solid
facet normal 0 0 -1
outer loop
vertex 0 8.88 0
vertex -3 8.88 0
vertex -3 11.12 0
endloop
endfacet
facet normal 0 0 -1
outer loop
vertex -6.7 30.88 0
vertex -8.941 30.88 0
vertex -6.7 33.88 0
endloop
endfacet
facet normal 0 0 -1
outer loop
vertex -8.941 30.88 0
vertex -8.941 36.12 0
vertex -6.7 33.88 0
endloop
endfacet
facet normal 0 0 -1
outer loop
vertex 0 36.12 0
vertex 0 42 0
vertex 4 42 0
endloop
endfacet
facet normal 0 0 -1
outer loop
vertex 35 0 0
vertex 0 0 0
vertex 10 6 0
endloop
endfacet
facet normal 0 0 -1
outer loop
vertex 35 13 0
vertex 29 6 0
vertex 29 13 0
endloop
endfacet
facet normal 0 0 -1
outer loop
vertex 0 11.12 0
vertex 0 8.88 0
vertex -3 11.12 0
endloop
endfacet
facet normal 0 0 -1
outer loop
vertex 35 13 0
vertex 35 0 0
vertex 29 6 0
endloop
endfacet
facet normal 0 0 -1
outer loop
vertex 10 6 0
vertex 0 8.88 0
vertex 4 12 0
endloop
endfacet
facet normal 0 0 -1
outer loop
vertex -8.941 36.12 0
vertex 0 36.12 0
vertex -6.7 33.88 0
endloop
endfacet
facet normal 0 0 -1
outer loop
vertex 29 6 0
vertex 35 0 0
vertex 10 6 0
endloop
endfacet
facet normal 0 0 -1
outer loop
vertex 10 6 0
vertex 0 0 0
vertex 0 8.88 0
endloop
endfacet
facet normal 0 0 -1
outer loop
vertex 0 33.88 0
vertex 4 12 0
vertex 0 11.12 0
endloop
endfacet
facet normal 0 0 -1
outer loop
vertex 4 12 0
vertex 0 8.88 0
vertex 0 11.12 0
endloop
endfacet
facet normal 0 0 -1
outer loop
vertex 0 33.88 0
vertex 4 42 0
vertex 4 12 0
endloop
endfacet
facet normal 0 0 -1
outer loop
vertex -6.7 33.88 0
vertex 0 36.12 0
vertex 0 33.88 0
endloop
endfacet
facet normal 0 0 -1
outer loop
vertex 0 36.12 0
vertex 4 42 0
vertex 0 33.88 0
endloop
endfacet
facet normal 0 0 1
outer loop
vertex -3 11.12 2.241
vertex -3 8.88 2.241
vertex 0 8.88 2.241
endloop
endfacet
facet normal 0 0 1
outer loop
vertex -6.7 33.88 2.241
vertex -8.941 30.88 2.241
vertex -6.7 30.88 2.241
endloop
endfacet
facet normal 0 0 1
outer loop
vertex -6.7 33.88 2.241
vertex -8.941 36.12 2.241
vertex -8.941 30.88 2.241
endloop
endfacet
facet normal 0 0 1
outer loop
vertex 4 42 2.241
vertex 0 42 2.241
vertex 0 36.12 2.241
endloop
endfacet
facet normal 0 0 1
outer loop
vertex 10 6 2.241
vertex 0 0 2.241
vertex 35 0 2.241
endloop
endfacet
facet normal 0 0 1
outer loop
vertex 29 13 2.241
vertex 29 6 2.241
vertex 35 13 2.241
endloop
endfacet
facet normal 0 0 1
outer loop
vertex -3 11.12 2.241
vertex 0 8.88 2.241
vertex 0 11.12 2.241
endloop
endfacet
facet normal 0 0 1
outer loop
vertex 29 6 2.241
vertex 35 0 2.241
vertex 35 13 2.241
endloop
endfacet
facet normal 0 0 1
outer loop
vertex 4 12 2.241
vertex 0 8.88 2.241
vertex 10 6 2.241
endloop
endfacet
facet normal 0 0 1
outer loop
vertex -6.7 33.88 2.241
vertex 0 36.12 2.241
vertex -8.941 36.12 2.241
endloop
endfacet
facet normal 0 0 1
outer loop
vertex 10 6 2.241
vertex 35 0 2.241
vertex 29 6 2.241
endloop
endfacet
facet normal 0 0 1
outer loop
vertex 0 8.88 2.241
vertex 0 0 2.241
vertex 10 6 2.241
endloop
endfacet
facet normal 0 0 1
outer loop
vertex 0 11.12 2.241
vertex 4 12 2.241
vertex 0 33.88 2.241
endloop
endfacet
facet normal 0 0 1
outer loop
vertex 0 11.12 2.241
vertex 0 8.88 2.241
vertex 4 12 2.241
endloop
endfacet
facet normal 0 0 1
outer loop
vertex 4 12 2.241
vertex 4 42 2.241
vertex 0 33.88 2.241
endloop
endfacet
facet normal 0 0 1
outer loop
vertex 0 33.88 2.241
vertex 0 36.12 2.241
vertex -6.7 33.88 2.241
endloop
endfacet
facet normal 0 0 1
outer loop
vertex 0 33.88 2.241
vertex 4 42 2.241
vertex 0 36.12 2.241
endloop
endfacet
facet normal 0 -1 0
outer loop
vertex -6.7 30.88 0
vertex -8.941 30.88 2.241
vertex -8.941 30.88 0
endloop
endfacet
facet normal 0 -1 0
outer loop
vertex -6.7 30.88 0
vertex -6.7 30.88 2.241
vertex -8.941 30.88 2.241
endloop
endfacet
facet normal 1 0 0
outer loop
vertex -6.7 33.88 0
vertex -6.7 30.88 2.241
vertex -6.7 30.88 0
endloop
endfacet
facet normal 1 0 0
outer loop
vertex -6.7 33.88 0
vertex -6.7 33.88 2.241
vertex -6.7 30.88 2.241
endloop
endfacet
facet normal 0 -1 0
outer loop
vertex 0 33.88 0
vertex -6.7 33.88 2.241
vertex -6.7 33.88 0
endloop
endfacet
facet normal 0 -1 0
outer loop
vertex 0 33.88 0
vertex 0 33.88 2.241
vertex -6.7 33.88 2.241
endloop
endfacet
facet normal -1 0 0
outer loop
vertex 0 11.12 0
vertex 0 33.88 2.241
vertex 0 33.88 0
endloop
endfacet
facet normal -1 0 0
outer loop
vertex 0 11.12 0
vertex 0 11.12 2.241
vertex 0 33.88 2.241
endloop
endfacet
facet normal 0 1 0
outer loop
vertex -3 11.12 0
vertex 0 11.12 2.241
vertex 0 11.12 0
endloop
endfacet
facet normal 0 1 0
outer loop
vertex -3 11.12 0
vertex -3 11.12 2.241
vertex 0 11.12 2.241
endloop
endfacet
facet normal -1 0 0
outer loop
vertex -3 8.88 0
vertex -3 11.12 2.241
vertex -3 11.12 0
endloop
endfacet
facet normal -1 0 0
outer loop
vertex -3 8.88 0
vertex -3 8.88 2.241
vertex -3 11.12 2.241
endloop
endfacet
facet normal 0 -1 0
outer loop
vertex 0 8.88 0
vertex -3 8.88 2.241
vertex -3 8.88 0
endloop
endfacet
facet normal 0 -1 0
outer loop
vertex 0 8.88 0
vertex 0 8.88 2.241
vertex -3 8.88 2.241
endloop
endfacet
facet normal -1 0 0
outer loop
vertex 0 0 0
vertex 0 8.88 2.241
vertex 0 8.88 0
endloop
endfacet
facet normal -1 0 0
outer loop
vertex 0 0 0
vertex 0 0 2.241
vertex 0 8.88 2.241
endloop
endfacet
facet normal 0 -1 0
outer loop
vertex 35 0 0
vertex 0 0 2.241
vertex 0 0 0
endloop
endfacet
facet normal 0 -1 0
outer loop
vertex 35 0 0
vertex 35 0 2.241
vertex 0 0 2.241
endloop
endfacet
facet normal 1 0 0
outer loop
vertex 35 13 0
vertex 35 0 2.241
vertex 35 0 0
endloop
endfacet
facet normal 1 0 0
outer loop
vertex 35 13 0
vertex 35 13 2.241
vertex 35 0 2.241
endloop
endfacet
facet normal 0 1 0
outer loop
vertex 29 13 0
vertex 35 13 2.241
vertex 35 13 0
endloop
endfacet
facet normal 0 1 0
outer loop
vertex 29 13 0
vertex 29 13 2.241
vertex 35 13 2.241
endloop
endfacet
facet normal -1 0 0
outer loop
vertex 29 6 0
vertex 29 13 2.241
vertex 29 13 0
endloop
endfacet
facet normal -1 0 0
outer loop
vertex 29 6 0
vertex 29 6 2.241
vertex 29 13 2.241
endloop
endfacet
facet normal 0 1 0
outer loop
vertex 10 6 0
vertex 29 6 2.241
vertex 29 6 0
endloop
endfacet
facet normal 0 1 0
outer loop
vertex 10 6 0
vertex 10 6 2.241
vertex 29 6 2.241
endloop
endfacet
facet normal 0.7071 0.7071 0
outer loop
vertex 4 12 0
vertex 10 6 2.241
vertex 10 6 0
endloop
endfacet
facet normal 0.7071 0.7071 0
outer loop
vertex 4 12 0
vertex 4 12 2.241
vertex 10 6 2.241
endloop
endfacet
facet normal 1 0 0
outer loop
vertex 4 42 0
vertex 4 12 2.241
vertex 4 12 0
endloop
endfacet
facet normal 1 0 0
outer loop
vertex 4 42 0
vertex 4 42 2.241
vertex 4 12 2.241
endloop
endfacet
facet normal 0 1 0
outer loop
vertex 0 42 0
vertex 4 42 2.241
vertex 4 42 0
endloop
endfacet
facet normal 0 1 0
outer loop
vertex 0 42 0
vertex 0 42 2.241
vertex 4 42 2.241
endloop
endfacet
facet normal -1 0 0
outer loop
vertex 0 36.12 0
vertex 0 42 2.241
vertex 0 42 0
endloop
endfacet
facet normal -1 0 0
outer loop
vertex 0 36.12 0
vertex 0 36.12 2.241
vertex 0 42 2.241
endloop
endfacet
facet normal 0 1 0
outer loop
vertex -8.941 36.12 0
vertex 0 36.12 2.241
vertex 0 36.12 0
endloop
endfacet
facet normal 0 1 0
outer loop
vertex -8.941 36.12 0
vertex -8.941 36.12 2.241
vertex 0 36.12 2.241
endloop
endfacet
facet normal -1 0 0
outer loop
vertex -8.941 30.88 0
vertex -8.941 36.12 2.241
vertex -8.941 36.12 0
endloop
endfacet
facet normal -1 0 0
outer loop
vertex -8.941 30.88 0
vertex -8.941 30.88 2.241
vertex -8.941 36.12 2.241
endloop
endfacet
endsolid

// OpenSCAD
// Multiboard small-hole peg hook for light cables; dimensions in mm.
// Print as shown on its broad side at Z=0, no supports, 4 perimeters.
// In use +Y is up, +X faces away from the board. Hold the hook 1.5 mm high,
// push both pegs through, then lower so the downward return catches the rear.
// Lift before removal. The thin, flat pegs are intended for light cables only.
// Requires at least 6.25 mm behind the board; not for flush-mounted tiles.
// Independent accessory, not a reproduction of a tile, thread or Peg Click.
// Keep Making / MultiBuild: https://docs.multibuild.io/beginner-section/core-parts-documentation
// Official grid: 25 mm. Measured original tile: 6.4 mm thick; small thread
// 6 mm minor / 7 mm major diameter, 3 mm pitch (not a metric screw thread).
// Dimensional reference, not an official tolerance specification:
// https://github.com/asciipip/multiboard-parametric-stacked/blob/master/multiboard_base.scad
// Only dimensions used, no source or model geometry copied.
// Original system licence: https://multibuild.io/license (conditional remixes).
// This hook uses smooth clearance pegs, not the proprietary thread profile.
// Fit, insertion and load capacity require a physical trial print.

// Usable projection from the upright (mm).
reach = 25; // [15:1:40]
// Arm thickness in its bending direction (mm).
arm_thickness = 6; // [4:1:9]
// Front retaining lip above the arm (mm).
lip_height = 7; // [4:1:12]
// Upright thickness against the board (mm).
back_thickness = 4; // [3:0.5:6]
// Actual tile thickness; default is the original octagonal tile (mm).
board_thickness = 6.4; // [6:0.1:8]
// Fit allowance: reduces the pegs and increases the board gap (mm).
tolerance = 0.3; // [0.2:0.05:0.4]

/* [Hidden] */
pitch = 25;
hole_minor = 6;
// Size the ENTIRE return to pass through the throat when shifted upward.
// Its rectangular envelope is (peg_side + return_drop) by peg_side;
// the diagonal equals hole_minor - tolerance, including the return.
return_drop = 3;
peg_side = (sqrt(2 * (hole_minor - tolerance) * (hole_minor - tolerance)
                - return_drop * return_drop) - return_drop) / 2;
gap = board_thickness + tolerance;
lower_y = 10;
upper_y = lower_y + pitch;
tip = back_thickness + reach;
eps = 0.02;

color("#89c454") linear_extrude(height = peg_side)
    union() {
        polygon(points = [
            [0, 0], [tip + arm_thickness, 0],
            [tip + arm_thickness, arm_thickness + lip_height],
            [tip, arm_thickness + lip_height], [tip, arm_thickness],
            [back_thickness + arm_thickness, arm_thickness],
            [back_thickness, 2 * arm_thickness],
            [back_thickness, upper_y + 7], [0, upper_y + 7]
        ]);
        // Short locating peg enters the second small hole on the same column.
        translate([-3, lower_y - peg_side / 2])
            square([3 + eps, peg_side]);
        // Neck through the board and a downward return behind the lower rim.
        translate([-gap - peg_side, upper_y - peg_side / 2])
            square([gap + peg_side + eps, peg_side]);
        translate([-gap - peg_side, upper_y - peg_side / 2 - return_drop])
            square([peg_side, peg_side + return_drop]);
    }
